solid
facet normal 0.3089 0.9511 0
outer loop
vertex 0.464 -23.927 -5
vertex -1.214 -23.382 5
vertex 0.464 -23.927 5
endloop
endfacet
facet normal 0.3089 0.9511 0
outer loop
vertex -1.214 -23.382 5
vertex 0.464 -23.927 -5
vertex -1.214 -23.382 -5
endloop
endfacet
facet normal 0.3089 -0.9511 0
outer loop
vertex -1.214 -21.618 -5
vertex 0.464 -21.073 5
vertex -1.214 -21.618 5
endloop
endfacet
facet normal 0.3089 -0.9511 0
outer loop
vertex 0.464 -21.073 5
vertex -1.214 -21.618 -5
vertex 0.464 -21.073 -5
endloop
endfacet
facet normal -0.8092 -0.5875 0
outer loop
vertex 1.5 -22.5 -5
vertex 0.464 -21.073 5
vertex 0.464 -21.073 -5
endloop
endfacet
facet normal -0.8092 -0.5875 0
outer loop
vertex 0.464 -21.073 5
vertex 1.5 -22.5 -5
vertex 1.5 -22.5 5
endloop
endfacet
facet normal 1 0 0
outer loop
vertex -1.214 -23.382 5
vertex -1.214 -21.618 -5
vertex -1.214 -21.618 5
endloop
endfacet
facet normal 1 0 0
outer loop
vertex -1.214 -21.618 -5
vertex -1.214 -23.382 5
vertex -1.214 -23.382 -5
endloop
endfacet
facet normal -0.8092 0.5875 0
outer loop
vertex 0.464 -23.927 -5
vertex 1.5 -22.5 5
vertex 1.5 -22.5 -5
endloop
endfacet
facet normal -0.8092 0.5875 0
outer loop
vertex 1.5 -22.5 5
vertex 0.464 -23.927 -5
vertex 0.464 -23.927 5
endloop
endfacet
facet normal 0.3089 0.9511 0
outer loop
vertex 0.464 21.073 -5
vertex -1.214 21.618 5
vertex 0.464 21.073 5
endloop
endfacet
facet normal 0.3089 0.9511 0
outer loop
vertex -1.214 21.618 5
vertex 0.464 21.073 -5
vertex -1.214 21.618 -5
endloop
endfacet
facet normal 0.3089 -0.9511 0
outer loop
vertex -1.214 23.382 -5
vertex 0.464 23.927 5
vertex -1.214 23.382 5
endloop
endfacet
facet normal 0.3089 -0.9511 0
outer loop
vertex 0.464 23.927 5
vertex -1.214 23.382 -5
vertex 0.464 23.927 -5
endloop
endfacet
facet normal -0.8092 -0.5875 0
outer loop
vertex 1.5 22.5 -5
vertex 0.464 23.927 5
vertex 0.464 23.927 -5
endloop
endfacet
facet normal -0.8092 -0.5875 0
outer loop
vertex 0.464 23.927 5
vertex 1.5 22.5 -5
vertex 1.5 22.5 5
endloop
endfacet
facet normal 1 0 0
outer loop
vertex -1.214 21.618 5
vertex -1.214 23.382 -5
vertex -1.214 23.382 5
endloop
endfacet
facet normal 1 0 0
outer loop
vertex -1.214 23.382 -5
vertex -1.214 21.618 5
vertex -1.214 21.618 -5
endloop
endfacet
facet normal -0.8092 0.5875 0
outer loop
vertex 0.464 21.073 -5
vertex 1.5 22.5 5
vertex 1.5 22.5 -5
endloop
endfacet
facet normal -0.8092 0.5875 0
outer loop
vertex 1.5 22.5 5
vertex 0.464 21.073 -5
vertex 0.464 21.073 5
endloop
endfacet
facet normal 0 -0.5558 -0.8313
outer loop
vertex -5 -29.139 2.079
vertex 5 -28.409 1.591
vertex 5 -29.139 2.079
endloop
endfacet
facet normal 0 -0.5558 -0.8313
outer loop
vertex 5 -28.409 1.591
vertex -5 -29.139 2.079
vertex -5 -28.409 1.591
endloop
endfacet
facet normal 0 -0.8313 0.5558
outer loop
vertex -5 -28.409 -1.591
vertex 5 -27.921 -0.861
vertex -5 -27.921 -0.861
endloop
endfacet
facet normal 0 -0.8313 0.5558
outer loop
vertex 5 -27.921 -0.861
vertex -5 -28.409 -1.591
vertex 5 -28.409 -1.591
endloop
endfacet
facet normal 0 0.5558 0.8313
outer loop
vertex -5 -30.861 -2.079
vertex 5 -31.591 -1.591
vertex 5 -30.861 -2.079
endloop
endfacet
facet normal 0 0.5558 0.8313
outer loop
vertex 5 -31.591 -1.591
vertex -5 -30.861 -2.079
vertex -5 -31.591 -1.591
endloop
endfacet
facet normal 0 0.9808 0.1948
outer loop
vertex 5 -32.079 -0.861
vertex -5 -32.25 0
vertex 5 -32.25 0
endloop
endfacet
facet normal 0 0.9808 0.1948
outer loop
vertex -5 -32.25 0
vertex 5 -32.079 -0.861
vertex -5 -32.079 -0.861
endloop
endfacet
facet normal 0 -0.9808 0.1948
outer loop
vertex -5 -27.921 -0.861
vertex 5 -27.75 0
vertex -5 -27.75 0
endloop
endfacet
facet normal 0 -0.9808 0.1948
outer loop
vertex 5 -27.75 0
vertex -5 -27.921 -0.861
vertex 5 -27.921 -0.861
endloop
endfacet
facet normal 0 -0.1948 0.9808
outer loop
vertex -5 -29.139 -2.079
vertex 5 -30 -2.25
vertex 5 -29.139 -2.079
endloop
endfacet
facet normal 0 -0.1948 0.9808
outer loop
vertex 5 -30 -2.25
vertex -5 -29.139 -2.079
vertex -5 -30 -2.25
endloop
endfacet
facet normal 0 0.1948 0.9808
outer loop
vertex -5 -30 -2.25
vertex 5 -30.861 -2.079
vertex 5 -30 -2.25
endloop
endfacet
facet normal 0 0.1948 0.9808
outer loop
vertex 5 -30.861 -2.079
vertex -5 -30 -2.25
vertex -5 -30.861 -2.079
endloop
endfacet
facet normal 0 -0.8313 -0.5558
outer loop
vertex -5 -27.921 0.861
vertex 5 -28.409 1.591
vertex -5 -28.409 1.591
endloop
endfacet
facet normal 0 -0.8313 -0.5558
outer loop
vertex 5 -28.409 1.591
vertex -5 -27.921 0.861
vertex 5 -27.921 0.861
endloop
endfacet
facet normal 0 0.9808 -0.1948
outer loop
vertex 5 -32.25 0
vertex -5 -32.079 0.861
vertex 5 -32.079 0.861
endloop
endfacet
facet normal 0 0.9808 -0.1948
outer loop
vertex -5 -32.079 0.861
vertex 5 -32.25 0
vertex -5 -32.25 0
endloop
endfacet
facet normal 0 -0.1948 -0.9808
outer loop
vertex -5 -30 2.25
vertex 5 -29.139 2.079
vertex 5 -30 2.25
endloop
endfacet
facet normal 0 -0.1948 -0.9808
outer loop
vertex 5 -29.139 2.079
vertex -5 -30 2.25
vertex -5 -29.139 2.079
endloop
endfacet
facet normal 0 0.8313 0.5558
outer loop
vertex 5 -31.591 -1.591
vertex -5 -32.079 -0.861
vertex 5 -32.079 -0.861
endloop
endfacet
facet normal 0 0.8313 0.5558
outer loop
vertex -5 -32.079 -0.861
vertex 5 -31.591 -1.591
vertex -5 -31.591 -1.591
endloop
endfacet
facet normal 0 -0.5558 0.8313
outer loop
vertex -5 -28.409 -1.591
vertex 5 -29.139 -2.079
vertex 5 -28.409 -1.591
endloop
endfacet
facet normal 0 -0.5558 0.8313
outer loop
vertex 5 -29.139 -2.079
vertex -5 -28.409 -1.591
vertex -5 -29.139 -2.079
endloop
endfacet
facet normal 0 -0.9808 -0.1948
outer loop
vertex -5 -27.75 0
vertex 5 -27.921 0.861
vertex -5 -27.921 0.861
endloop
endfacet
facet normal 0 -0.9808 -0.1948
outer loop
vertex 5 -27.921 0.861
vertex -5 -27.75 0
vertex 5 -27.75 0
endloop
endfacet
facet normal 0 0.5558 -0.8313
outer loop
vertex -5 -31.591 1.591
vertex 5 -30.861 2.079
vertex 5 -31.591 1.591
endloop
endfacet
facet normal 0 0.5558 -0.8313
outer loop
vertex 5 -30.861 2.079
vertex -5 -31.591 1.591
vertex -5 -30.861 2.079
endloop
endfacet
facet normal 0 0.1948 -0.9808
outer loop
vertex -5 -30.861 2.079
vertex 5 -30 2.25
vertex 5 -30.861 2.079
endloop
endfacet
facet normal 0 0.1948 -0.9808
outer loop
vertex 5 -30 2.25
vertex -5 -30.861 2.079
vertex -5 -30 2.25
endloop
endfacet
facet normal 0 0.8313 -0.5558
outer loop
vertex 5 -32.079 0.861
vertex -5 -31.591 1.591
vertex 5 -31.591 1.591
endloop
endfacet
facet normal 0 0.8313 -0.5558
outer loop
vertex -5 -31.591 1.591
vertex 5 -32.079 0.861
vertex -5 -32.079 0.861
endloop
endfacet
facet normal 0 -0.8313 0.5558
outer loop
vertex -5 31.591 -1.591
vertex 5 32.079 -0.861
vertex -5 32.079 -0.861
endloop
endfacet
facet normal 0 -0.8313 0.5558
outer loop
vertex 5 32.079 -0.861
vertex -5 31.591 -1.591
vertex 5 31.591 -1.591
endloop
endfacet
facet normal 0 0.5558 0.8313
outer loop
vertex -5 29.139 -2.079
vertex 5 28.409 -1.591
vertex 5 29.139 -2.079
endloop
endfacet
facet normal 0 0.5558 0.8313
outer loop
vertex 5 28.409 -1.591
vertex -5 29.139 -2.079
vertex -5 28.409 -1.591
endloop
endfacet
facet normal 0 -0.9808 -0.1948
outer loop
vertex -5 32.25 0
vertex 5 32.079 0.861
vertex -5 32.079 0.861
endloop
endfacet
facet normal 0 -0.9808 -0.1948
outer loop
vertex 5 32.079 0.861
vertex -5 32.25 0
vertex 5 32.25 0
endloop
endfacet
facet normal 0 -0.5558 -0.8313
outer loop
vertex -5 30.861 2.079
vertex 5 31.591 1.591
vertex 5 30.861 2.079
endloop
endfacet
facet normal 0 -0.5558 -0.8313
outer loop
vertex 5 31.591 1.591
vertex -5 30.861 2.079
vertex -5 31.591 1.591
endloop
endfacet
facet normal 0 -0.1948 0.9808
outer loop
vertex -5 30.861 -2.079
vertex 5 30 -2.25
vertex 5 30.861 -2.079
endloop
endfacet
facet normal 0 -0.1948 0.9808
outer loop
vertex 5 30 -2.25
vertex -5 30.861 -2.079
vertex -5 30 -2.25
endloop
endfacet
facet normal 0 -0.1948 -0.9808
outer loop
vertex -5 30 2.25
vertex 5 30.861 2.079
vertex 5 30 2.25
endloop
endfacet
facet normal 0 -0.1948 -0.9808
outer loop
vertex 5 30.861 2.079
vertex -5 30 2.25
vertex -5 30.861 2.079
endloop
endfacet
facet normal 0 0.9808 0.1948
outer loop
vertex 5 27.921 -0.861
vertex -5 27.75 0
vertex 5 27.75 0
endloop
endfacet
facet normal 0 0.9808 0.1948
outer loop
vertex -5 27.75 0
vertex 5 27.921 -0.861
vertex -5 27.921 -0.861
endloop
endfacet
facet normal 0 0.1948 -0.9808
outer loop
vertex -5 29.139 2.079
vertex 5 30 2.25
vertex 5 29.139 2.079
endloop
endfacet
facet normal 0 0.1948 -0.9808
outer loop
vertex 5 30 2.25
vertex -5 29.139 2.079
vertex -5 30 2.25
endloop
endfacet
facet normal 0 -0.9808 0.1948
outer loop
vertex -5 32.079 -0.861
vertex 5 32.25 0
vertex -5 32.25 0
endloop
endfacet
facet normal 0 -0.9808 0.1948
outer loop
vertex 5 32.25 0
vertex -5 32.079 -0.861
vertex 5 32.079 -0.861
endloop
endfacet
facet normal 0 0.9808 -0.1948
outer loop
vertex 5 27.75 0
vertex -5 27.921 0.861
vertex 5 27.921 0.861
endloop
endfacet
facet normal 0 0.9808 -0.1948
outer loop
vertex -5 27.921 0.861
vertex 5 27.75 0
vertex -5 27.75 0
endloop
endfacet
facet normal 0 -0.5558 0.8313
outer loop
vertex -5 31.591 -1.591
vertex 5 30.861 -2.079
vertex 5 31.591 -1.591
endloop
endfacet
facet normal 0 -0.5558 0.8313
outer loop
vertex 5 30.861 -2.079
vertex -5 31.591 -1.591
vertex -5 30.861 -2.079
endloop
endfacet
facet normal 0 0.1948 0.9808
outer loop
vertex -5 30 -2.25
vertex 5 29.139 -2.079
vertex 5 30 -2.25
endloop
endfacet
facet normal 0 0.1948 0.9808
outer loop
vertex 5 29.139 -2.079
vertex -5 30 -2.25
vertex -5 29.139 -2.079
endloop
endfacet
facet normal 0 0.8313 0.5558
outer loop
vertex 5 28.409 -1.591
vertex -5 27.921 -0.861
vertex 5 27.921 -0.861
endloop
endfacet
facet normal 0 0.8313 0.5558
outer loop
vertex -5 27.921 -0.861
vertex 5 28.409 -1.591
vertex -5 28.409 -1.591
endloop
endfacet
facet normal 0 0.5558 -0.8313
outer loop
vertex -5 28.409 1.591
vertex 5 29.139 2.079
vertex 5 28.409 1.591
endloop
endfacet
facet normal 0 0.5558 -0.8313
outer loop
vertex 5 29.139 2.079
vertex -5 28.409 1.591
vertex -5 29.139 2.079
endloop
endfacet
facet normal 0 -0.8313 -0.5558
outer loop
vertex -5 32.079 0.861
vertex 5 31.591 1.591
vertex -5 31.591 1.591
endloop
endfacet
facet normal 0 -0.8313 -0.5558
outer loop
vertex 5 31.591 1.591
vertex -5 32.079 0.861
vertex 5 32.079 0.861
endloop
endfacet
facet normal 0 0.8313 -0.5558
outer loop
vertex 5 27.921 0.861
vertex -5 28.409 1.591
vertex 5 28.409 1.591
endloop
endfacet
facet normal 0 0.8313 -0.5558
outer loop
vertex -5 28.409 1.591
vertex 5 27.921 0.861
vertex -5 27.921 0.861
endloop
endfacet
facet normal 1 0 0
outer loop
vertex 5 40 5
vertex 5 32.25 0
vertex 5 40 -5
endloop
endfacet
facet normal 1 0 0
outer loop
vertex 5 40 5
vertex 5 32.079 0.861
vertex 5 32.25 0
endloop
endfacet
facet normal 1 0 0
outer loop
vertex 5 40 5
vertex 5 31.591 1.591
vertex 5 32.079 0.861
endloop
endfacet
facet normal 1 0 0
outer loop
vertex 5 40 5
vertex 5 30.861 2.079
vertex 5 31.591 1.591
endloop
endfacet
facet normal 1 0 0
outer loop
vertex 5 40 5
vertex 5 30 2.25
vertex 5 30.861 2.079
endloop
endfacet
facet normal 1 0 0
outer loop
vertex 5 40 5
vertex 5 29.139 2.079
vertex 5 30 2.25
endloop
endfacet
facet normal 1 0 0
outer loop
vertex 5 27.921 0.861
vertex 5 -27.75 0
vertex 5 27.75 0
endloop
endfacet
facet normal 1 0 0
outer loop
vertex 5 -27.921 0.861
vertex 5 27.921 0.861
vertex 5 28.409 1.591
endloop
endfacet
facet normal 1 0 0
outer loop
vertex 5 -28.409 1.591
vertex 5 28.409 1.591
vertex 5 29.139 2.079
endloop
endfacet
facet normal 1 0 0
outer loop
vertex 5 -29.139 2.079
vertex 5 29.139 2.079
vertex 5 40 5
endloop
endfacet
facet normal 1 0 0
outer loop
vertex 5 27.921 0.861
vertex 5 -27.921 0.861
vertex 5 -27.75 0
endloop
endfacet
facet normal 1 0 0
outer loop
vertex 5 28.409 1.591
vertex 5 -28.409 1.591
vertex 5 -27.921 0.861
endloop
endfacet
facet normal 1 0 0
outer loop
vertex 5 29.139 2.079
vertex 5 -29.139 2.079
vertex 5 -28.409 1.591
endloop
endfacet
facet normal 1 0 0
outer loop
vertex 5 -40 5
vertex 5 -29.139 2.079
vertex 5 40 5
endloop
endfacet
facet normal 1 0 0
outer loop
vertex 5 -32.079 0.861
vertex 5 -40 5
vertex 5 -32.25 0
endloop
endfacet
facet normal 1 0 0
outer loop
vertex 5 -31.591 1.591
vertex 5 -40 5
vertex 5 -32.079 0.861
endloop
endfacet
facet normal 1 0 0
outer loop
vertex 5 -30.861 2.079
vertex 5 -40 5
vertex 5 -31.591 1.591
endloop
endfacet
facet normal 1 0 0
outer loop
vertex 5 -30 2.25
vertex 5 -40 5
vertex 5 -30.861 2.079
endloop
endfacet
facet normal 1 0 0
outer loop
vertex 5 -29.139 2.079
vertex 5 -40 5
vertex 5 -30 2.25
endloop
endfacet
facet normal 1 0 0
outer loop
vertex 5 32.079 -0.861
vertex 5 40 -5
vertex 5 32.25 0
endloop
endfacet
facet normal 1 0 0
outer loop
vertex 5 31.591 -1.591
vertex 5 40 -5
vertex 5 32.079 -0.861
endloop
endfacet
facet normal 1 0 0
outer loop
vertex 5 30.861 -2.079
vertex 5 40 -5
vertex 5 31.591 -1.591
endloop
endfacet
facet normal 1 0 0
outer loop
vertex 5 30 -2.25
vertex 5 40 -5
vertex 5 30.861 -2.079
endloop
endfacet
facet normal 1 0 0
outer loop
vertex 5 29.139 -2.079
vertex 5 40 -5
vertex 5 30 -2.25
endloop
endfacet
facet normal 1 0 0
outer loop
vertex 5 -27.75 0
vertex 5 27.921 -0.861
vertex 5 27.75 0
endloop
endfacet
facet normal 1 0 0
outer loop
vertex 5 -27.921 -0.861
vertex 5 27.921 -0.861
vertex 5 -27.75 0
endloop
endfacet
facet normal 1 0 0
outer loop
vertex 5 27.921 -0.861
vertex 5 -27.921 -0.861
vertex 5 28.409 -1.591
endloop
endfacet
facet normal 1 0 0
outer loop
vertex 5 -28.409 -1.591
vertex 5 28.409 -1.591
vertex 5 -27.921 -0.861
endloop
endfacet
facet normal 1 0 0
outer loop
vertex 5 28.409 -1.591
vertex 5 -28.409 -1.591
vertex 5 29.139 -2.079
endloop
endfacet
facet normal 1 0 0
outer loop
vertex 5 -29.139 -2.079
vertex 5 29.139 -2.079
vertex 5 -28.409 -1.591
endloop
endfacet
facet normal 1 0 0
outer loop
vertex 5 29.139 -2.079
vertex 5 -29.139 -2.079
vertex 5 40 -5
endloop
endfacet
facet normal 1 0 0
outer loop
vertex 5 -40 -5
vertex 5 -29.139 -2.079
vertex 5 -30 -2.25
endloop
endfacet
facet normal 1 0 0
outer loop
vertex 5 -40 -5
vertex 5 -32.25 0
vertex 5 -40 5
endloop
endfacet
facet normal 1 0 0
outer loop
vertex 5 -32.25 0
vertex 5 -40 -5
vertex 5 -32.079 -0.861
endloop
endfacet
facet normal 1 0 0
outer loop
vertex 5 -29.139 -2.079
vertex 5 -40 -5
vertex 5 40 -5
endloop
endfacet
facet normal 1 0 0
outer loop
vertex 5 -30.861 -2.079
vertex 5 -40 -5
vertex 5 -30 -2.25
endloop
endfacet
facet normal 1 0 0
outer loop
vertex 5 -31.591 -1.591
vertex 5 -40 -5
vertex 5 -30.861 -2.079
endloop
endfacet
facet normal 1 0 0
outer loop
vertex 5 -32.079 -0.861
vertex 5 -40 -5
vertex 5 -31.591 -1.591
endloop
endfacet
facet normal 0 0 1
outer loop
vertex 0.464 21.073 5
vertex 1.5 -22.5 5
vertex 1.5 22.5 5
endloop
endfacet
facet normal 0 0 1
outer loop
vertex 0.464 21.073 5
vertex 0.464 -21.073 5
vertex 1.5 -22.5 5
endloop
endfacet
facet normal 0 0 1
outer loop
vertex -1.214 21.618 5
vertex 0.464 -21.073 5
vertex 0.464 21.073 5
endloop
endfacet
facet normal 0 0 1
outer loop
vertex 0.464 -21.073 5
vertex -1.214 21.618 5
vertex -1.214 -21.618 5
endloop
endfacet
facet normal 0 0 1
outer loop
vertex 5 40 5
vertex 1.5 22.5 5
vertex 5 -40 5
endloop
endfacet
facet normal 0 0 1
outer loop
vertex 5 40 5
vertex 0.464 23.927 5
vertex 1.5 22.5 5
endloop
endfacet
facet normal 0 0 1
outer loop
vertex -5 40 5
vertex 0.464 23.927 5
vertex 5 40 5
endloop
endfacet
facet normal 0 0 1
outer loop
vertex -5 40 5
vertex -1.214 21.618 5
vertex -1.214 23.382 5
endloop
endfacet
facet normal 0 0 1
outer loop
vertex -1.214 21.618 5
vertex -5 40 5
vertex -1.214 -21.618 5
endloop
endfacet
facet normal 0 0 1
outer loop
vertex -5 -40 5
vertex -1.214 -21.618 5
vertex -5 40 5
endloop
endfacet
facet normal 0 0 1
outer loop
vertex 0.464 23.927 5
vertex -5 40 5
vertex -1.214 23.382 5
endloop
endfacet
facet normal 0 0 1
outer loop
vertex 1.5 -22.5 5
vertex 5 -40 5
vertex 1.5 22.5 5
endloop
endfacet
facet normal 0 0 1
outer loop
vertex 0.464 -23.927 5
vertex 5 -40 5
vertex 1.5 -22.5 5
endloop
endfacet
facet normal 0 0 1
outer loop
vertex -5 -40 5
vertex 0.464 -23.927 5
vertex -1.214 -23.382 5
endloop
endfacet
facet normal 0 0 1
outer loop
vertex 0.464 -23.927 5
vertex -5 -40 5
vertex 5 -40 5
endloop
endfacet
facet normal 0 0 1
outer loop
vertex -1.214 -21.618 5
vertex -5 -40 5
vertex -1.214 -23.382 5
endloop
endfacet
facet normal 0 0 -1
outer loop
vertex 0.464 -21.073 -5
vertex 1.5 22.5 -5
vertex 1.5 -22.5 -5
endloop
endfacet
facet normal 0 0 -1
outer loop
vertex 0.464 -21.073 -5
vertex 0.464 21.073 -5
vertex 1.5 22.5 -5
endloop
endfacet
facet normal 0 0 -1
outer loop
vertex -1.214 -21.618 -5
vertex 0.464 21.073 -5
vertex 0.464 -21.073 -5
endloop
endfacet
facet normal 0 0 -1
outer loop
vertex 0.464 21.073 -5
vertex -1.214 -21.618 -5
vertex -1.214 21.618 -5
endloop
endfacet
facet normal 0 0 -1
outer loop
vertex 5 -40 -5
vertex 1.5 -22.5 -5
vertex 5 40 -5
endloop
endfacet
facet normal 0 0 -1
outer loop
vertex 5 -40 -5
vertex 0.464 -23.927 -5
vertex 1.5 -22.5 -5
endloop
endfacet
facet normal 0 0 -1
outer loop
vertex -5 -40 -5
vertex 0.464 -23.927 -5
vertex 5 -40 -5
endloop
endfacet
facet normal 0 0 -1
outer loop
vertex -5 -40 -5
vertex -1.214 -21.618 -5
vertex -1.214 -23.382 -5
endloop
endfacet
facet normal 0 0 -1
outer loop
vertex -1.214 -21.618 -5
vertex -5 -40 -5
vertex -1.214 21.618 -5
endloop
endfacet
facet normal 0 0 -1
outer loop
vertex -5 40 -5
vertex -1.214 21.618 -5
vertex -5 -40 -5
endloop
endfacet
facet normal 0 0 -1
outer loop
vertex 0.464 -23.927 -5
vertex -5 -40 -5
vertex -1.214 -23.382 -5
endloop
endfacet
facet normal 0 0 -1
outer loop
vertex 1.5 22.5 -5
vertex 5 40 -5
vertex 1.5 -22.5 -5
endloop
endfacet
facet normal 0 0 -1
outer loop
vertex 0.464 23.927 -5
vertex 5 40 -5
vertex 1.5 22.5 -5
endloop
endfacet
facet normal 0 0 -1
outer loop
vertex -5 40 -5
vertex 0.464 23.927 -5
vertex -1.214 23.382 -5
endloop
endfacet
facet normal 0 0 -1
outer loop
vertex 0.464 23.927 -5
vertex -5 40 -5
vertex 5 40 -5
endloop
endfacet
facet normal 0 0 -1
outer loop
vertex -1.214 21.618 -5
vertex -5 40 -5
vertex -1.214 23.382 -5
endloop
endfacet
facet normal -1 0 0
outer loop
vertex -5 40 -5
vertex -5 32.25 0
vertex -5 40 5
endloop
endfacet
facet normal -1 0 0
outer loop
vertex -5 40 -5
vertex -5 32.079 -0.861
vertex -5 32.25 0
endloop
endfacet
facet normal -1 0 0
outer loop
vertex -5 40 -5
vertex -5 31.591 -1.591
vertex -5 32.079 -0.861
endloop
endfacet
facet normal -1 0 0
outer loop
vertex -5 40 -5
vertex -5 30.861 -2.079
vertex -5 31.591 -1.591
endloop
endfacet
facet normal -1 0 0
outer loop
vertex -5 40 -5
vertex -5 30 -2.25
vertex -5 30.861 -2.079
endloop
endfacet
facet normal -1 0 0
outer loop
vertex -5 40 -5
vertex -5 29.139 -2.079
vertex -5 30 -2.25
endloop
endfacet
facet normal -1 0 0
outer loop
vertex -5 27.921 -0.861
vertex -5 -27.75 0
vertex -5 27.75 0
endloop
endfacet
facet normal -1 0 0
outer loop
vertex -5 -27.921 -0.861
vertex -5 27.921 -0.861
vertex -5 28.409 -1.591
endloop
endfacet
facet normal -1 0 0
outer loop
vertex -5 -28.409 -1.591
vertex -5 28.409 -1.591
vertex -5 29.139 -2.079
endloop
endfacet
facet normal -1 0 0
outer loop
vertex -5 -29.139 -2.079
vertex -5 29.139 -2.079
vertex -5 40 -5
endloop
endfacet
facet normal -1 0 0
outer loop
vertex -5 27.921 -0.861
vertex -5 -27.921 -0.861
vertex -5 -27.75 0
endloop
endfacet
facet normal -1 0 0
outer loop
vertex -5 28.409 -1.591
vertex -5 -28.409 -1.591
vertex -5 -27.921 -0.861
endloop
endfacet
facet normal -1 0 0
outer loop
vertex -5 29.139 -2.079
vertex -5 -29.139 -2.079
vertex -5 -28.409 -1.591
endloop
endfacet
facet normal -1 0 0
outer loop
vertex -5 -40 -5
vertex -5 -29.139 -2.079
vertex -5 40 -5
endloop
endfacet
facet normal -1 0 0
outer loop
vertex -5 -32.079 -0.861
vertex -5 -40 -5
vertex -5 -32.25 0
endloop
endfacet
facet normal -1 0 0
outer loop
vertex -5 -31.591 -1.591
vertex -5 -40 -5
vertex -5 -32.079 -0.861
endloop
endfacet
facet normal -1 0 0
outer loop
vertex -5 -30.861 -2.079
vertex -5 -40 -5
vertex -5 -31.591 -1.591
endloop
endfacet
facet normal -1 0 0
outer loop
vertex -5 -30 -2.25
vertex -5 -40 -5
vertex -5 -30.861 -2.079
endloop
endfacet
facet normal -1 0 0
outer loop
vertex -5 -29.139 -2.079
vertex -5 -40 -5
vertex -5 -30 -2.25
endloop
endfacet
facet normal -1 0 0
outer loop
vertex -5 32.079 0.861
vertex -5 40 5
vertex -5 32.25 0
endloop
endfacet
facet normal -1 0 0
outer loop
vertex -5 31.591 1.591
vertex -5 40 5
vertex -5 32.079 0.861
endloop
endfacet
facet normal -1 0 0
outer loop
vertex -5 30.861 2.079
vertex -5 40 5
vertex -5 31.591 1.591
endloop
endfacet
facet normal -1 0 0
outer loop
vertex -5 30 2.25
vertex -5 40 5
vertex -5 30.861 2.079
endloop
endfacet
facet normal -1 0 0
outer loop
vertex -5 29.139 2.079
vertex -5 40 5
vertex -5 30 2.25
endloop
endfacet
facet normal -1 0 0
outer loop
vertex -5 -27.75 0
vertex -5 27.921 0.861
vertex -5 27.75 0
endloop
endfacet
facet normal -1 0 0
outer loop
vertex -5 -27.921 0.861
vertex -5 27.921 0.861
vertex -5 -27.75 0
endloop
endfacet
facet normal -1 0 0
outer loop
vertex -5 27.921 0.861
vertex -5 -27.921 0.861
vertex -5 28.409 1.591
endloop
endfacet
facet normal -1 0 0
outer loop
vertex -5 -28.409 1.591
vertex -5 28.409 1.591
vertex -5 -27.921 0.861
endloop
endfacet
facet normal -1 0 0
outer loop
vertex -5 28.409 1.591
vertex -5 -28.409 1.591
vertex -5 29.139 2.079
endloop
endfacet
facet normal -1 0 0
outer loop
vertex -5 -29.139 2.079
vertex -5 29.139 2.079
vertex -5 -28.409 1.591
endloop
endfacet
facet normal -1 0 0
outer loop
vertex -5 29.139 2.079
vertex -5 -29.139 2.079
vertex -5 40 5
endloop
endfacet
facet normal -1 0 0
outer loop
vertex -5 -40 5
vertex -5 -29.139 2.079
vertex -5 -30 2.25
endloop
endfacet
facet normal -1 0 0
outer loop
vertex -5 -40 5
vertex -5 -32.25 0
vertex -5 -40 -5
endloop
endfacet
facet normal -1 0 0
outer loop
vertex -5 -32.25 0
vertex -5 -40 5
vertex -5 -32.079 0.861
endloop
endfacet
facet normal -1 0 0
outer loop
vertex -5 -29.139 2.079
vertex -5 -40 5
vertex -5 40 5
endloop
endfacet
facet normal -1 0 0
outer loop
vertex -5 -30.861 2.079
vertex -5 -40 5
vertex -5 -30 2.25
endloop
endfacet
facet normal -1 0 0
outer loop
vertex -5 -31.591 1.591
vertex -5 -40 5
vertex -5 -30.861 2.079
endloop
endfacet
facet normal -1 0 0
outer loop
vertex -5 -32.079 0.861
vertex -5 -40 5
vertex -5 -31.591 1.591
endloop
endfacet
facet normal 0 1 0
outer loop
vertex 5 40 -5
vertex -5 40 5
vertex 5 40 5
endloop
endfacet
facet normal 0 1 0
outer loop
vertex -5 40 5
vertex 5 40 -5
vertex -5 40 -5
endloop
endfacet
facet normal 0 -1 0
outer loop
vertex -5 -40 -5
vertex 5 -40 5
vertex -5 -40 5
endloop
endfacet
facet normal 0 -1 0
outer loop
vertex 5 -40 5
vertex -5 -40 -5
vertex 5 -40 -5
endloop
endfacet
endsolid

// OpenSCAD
// file: dimensions.scad
width = 264;
depth = 80;

side_block_size = 10;

plate_mounting_screw_size = 3;
plate_mounting_screw_centres = 45;

switch_mounting_screw_size = 3;
switch_mounting_screw_centres = 12;

switch_arm_mounting_screw_size = 3;
// main file
include <dimensions.scad>

side_mounting_screw_diameter = 4.5;
side_mounting_screw_centres = 60;

module SideBlock() {
  difference() {
    // Body
    cube([side_block_size, depth, side_block_size], center=true);

    // Top/plate mounting holes
    for(y = [-plate_mounting_screw_centres/ 2, plate_mounting_screw_centres/ 2]) {
      translate([0, y, 0]) {
        cylinder(h = side_block_size + 0.1, d = plate_mounting_screw_size, center = true, $fn = 5);
      }
    }

    // Side/box mounting holes
    for(y = [-side_mounting_screw_centres / 2, side_mounting_screw_centres / 2]) {
      translate([0, y, 0]) {
        rotate([0, 90, 0]) {
          cylinder(h = side_block_size + 0.1, d = side_mounting_screw_diameter, center = true, $fn = 16);
        }
      }
    }
  }
}

SideBlock();
